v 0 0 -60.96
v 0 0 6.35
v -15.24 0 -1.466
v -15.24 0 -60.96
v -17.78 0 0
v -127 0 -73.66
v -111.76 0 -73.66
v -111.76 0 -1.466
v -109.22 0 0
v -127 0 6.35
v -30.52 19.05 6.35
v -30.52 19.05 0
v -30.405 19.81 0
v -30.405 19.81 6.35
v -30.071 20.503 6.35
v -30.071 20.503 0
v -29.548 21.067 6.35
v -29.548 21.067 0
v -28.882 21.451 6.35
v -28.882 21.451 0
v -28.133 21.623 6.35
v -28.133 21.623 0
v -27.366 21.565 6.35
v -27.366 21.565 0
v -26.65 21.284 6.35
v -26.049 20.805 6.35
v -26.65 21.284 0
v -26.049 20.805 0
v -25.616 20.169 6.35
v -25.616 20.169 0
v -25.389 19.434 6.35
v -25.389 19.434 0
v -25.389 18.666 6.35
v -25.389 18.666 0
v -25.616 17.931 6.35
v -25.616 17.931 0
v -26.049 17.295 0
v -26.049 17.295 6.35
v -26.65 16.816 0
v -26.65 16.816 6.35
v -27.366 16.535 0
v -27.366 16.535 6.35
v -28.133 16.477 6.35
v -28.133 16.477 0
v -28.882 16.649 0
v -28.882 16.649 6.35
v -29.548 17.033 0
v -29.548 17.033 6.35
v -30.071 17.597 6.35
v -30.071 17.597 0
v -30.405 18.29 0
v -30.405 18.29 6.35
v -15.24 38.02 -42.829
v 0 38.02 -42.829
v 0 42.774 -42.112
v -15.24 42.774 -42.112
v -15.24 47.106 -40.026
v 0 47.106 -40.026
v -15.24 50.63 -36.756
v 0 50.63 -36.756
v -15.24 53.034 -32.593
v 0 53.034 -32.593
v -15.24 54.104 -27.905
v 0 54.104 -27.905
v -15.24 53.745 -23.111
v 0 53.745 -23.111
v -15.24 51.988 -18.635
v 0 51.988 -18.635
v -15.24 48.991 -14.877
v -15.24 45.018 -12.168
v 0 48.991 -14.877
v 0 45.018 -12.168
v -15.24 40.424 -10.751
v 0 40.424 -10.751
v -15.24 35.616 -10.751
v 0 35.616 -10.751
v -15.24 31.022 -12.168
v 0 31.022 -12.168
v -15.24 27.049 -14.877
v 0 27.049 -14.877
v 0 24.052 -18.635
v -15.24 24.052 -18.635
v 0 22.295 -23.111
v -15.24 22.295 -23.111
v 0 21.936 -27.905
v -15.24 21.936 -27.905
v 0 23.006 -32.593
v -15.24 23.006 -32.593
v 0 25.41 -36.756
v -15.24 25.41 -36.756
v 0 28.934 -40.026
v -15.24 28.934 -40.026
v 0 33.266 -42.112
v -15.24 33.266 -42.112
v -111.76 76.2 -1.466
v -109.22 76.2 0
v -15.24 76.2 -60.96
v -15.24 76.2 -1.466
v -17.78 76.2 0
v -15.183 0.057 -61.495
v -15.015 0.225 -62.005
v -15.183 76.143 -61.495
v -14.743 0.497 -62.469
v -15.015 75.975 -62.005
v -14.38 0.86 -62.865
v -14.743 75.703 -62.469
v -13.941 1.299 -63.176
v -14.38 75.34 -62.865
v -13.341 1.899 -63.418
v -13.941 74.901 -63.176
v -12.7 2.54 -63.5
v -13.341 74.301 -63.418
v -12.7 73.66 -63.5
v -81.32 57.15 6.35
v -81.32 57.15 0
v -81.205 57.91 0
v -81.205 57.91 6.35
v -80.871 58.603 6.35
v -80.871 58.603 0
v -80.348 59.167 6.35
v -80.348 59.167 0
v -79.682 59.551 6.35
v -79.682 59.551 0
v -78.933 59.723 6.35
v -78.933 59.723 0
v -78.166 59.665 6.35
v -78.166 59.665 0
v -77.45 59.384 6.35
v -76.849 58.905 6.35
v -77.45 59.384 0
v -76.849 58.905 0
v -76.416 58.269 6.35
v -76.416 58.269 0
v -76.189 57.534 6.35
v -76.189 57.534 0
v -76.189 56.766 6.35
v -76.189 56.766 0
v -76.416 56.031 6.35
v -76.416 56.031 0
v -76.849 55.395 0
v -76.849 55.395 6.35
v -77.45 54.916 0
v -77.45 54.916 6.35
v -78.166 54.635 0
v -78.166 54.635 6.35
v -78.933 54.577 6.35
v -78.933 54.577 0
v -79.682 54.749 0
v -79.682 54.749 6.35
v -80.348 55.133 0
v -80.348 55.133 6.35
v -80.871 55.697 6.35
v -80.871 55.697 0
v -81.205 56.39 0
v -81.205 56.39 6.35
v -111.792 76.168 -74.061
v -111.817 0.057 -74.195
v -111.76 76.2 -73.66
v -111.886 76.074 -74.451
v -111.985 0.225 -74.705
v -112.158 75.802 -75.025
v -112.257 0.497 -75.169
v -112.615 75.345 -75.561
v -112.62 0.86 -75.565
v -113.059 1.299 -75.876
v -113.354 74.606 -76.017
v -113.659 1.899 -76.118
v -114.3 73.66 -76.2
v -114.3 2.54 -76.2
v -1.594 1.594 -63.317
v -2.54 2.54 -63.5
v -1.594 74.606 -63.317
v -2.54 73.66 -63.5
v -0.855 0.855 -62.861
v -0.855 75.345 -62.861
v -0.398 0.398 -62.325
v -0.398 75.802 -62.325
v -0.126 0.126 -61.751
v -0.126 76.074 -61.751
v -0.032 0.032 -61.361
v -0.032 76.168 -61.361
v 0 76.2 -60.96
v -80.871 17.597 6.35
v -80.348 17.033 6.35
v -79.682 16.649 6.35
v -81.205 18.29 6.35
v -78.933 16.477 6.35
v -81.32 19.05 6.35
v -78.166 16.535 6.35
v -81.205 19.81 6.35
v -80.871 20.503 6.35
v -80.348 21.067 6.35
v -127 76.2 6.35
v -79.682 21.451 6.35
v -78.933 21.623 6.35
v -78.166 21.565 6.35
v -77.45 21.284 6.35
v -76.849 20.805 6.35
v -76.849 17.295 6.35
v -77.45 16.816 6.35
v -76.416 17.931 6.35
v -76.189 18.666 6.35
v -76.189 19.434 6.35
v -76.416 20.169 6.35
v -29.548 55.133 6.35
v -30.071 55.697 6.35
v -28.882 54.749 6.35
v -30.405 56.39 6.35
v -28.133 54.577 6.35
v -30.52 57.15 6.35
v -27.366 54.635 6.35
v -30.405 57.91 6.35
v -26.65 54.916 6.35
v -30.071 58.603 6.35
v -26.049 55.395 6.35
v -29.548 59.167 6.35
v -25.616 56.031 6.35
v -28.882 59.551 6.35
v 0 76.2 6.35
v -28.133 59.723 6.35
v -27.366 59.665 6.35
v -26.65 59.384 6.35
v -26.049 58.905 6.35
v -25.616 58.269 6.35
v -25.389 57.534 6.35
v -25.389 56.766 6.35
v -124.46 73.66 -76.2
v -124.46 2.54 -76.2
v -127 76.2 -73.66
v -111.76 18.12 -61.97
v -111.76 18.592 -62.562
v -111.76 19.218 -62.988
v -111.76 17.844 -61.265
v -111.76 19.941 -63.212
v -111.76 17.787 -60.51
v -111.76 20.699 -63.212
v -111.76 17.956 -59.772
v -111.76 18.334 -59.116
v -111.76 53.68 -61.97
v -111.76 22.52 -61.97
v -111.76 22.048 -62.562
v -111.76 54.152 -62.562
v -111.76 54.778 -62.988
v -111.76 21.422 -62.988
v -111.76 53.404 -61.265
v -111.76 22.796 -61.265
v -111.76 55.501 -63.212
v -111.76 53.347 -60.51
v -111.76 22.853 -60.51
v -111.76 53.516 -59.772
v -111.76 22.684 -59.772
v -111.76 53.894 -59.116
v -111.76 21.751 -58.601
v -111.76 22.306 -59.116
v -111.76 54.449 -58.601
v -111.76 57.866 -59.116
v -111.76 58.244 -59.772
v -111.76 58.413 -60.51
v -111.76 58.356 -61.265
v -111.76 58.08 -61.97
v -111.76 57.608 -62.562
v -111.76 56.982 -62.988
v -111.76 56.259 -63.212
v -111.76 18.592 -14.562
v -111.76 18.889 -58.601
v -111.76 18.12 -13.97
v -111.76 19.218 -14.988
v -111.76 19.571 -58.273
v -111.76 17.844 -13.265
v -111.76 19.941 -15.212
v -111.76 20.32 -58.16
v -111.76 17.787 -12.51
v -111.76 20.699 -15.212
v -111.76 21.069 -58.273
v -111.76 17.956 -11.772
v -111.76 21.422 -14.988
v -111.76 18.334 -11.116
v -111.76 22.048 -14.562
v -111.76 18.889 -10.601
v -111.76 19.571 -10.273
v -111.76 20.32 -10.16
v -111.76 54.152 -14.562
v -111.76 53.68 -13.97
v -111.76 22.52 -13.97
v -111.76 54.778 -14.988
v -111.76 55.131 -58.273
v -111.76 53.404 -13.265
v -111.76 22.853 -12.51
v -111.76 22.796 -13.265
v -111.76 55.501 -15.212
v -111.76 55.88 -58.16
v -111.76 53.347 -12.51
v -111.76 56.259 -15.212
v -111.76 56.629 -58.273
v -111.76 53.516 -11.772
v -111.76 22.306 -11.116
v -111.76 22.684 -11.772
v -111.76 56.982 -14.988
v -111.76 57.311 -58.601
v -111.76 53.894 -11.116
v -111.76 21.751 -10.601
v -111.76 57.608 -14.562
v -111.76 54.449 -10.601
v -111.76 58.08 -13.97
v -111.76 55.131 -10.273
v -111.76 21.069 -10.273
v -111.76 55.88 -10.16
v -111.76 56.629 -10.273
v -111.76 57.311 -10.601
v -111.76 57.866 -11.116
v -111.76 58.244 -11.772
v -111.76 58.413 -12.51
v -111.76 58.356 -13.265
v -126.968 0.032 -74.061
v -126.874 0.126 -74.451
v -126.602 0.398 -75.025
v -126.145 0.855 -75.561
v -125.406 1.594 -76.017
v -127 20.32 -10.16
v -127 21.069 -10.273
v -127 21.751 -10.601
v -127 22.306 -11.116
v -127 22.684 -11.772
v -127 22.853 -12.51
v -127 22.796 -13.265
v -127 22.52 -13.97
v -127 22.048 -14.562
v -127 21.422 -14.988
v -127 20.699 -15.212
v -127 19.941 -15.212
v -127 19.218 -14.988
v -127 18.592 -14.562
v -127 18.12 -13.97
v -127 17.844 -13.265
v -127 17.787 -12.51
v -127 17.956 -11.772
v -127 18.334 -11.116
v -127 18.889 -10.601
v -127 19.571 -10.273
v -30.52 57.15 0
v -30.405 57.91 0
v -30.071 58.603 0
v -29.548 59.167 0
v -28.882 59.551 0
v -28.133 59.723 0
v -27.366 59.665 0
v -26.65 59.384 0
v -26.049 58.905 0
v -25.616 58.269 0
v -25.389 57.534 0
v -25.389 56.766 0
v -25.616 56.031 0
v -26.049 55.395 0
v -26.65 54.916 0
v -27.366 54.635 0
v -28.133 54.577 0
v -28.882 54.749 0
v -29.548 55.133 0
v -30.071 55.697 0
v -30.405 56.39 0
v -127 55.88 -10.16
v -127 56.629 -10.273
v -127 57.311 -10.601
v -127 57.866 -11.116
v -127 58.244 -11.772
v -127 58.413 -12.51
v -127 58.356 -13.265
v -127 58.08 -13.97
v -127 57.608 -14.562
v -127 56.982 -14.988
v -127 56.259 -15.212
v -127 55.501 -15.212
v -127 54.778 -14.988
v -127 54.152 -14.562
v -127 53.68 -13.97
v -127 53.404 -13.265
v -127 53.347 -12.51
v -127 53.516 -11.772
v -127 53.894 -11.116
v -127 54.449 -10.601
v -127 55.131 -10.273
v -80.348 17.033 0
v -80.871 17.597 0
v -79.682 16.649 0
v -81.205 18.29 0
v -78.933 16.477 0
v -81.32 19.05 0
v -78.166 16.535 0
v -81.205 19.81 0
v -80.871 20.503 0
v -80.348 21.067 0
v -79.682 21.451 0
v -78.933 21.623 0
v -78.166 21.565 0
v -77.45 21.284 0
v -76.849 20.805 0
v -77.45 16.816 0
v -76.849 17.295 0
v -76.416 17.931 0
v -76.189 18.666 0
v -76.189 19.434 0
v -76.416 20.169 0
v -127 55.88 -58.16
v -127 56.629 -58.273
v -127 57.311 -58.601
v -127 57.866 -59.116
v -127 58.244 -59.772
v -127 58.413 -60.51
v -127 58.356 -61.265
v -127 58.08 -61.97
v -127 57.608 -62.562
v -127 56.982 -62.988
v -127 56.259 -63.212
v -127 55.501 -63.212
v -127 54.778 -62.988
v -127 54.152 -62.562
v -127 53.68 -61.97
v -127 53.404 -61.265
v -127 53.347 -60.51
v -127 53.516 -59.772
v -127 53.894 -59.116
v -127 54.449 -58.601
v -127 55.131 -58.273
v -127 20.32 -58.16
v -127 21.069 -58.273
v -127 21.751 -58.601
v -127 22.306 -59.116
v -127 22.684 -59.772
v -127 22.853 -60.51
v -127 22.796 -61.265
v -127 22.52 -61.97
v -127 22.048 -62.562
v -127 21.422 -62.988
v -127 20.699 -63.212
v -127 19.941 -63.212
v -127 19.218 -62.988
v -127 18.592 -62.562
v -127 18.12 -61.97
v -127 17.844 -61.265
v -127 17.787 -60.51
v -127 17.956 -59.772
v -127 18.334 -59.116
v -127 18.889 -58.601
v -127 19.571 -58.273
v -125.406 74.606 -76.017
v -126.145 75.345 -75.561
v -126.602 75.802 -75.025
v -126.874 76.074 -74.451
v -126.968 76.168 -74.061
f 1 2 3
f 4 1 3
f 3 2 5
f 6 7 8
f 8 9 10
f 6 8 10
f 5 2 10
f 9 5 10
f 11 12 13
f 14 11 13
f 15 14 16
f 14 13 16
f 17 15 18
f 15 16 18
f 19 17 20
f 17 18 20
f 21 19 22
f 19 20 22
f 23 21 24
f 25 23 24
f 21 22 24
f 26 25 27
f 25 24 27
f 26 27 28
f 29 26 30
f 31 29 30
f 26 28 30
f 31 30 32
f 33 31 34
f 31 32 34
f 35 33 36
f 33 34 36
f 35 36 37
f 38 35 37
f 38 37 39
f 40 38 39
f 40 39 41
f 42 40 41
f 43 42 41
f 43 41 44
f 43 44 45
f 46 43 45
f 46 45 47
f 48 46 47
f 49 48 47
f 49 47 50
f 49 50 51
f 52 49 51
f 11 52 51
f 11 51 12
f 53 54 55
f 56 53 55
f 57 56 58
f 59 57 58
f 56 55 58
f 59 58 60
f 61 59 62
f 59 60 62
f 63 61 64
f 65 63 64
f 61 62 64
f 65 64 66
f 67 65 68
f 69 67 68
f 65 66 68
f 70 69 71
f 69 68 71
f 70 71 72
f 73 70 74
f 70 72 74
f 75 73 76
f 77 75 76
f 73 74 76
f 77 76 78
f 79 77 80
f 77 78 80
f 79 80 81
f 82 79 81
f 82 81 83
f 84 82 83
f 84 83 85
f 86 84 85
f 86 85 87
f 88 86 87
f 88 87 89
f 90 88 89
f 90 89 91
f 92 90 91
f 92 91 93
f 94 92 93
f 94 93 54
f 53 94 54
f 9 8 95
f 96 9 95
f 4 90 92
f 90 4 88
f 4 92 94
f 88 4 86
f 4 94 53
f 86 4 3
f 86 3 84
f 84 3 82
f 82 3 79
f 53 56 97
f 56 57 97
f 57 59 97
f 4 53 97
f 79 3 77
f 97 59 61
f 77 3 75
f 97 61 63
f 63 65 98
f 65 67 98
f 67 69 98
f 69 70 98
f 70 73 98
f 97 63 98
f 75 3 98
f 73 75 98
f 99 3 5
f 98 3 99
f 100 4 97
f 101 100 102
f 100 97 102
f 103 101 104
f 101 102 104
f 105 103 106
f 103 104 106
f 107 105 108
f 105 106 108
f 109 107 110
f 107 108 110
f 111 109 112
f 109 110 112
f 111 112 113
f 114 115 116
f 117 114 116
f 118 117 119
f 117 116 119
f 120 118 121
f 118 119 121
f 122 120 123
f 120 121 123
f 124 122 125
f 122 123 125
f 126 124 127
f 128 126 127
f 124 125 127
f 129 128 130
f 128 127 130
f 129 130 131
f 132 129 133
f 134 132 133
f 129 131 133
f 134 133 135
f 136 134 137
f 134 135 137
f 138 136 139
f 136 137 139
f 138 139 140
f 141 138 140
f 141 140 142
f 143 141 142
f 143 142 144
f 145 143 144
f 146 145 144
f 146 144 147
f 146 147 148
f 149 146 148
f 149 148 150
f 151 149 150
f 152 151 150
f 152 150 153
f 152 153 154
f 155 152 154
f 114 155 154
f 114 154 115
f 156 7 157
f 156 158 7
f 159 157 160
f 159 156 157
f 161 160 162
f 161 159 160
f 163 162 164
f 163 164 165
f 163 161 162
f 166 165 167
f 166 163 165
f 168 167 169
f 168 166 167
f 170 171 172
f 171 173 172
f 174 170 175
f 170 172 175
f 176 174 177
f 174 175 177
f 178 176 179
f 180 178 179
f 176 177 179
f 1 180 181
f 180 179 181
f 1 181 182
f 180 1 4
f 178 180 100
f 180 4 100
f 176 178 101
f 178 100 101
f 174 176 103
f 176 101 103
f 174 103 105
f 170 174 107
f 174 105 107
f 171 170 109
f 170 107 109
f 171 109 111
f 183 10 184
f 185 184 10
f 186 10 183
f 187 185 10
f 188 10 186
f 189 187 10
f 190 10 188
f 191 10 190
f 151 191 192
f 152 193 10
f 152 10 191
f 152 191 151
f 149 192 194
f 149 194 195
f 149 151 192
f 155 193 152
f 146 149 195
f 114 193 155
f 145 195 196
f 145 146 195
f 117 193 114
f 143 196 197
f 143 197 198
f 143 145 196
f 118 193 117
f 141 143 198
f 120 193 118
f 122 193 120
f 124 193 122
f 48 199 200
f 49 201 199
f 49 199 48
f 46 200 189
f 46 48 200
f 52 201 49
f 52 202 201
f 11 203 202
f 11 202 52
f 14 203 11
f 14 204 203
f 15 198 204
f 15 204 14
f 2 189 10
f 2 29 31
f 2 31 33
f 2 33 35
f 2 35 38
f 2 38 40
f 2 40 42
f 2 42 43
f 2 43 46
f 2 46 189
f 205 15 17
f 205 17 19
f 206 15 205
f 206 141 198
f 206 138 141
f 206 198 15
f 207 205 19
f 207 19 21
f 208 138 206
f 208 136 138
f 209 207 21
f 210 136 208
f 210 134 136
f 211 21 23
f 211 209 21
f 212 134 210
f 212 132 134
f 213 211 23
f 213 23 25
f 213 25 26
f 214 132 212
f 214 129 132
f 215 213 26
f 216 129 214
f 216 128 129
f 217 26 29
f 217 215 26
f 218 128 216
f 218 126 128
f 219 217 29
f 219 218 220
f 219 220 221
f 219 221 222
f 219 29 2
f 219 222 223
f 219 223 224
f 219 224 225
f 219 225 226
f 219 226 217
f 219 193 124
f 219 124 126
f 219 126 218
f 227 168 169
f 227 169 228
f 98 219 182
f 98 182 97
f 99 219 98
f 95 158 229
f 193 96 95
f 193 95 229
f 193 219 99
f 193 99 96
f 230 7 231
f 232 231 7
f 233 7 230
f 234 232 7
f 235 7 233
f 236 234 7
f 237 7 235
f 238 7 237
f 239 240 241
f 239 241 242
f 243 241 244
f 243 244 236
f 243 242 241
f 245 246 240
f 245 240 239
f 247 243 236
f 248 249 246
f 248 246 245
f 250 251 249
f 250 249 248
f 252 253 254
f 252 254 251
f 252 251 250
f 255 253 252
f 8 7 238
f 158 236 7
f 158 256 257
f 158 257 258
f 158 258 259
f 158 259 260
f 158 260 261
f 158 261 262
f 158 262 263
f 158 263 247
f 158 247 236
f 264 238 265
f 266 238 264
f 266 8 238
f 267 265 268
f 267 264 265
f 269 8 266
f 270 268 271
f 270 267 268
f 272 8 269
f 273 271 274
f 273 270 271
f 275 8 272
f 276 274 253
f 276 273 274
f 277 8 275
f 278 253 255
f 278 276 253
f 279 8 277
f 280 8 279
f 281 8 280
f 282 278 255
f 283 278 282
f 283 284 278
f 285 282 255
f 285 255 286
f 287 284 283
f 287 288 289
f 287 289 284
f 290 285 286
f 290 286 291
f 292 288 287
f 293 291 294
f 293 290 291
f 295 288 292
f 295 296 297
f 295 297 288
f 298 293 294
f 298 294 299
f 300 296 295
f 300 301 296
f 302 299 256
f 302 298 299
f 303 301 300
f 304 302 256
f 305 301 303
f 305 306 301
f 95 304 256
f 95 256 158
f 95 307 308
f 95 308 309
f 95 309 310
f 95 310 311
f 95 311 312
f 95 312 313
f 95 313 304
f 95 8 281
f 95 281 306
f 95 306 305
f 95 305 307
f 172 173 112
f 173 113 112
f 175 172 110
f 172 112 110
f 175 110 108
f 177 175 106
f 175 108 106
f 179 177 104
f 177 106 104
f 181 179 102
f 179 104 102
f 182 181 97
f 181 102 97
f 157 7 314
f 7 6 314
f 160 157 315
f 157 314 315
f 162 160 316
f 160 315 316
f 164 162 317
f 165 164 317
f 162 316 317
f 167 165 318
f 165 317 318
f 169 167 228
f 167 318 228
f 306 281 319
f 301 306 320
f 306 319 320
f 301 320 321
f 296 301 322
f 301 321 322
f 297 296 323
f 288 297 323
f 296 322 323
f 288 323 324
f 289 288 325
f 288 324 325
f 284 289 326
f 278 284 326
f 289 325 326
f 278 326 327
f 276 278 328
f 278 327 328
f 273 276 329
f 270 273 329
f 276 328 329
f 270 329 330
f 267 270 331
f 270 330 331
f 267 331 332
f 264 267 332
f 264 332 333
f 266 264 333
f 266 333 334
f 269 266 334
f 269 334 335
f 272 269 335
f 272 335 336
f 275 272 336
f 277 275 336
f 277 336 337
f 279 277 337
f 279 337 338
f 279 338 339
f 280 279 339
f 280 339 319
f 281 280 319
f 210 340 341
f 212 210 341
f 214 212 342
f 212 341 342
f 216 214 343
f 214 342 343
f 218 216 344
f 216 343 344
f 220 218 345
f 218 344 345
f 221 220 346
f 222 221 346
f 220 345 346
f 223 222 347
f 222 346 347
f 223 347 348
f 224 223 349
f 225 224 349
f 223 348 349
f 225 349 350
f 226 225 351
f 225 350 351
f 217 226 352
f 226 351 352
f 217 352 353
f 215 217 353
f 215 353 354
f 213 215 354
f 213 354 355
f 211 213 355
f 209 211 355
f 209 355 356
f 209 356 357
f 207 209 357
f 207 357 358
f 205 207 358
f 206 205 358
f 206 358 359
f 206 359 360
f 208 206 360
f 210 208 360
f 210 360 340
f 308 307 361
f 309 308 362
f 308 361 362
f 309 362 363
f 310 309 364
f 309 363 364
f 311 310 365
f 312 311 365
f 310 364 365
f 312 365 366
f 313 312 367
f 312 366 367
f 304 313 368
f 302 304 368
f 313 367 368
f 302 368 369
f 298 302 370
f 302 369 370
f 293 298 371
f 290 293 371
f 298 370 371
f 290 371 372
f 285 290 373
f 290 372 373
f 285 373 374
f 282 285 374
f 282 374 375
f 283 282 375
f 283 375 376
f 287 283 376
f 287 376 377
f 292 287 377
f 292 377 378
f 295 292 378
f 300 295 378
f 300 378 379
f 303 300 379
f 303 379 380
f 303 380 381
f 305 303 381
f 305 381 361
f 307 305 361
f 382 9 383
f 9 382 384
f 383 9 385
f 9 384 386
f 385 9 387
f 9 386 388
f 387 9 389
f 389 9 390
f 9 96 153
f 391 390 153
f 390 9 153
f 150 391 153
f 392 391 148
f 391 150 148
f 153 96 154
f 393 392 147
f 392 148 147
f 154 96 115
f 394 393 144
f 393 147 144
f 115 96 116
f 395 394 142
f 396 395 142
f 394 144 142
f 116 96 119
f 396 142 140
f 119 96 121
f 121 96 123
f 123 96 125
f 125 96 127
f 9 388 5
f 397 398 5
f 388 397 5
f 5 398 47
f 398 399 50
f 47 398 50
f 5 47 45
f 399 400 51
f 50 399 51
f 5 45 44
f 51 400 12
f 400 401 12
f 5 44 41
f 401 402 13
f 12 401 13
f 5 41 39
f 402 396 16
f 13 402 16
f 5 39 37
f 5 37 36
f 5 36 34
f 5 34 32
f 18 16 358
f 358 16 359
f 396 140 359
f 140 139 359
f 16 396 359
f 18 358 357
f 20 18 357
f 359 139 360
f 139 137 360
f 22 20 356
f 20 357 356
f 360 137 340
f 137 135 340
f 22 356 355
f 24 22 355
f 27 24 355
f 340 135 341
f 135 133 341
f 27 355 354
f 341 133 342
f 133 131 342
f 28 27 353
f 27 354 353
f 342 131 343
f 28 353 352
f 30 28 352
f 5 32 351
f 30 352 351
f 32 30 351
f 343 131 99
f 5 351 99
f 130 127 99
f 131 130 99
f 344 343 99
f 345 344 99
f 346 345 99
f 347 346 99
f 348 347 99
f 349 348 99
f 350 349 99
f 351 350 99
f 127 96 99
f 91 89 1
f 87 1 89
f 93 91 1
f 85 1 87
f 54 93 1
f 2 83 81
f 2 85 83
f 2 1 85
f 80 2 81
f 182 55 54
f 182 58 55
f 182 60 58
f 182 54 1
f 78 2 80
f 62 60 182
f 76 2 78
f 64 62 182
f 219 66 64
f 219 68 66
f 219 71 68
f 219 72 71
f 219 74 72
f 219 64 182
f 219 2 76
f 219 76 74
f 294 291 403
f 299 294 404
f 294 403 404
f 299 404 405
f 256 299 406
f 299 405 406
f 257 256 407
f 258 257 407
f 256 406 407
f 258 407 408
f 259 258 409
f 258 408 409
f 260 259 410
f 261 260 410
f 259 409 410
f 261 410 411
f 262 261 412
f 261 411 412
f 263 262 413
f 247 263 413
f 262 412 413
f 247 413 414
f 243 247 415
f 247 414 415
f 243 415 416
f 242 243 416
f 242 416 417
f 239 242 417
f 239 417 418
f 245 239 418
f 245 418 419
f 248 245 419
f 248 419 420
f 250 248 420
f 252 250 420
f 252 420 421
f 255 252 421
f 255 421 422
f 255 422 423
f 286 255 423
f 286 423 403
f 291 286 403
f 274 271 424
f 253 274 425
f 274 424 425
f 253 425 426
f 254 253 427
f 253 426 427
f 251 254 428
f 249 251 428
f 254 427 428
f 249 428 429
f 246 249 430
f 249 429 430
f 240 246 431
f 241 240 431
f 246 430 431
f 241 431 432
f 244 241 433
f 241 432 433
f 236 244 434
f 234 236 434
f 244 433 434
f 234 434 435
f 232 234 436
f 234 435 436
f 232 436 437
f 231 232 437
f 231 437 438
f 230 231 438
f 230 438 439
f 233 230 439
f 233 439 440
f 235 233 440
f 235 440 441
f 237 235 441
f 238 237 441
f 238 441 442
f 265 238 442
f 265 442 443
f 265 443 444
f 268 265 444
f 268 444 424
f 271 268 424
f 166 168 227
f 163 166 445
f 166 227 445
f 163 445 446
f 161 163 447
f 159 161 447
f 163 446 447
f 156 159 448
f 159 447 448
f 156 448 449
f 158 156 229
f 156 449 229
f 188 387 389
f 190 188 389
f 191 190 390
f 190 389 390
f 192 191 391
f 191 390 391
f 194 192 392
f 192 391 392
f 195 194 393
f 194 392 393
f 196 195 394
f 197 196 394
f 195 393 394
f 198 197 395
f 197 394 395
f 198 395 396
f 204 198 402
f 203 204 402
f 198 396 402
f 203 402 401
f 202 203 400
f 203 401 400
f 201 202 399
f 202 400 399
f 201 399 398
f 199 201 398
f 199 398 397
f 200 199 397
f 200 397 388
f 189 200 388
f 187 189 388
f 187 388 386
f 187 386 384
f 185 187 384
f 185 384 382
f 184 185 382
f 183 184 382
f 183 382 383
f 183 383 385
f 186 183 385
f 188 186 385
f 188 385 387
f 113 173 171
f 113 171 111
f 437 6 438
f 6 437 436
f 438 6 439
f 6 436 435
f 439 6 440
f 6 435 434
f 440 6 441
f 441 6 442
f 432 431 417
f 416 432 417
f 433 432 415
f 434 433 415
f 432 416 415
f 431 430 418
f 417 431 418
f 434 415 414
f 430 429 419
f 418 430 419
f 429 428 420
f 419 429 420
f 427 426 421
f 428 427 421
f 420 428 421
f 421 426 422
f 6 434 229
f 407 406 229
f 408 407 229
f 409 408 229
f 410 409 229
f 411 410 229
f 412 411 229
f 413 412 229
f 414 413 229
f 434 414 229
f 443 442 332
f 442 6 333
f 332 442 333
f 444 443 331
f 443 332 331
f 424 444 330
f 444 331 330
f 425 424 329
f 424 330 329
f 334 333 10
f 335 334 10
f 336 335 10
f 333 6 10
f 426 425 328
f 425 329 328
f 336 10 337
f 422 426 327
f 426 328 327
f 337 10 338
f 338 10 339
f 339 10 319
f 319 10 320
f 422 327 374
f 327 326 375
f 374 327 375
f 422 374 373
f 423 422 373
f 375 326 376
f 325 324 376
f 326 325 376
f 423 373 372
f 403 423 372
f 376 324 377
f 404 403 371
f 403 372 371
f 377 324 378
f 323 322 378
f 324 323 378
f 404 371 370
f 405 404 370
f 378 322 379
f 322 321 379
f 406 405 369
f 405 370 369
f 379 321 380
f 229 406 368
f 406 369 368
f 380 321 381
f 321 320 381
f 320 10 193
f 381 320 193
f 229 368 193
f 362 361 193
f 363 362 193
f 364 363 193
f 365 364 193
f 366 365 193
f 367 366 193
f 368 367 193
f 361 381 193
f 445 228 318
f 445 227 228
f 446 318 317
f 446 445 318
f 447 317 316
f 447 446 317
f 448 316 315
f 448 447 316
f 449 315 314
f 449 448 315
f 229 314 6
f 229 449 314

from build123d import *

# Parameters (mm, degrees)
SKETCH2_W                        = 127
SKETCH2_H                        = 76.2
BOSS_EXTRUDE1_DEPTH              = 6.35
F_13_64_0_20313_DIAMETER_HOLE1_D = 5.159502
SKETCH5_W                        = 15.24
SKETCH5_H                        = 76.2
BOSS_EXTRUDE2_DEPTH              = 63.5
CHAMFER1_SIZE                    = 2.54
CHAMFER1_SIZE2                   = 1.466469684
FILLET3_R                        = 2.54
SKETCH9_W                        = 15.24
SKETCH9_H                        = 76.2
BOSS_EXTRUDE3_DEPTH              = 76.2
CHAMFER5_SIZE                    = 2.54
CHAMFER5_SIZE2                   = 1.466469684
FILLET5_R                        = 2.54
CUT_EXTRUDE1_REACH               = 129
SKETCH17_R                       = 2.54
CUT_EXTRUDE2_REACH               = 129
SKETCH18_R                       = 16.129


with BuildPart() as part:
    # Sketch2 → Boss-Extrude1 (new body)
    with BuildSketch(Plane.XY):
        with Locations((-63.5, 38.1)):
            Rectangle(SKETCH2_W, SKETCH2_H)
    extrude(amount=BOSS_EXTRUDE1_DEPTH)

    # 13/64 (0.20313) Diameter Hole1 (through all)
    with Locations(Plane.XY.offset(6.35)):
        with Locations((-78.74, 57.15), (-78.74, 19.05), (-27.94, 57.15), (-27.94, 19.05)):
            Hole(F_13_64_0_20313_DIAMETER_HOLE1_D / 2)

    # Sketch5 → Boss-Extrude2 (add)
    with BuildSketch(Plane(origin=(0, 0, 0), x_dir=(-1, 0, 0), z_dir=(0, 0, -1))):
        with Locations((7.62, 38.1)):
            Rectangle(SKETCH5_W, SKETCH5_H)
    extrude(amount=BOSS_EXTRUDE2_DEPTH)

    # Chamfer1
    chamfer1_edges = [part.edges().sort_by_distance(p)[0] for p in [
        (-15.24, 38.1, 0),
    ]]
    chamfer1_side = [part.faces().sort_by_distance(p)[0] for p in [
        (-71.296336335, 38.1, 0),
    ]]
    chamfer(chamfer1_edges, length=CHAMFER1_SIZE, length2=CHAMFER1_SIZE2, reference=chamfer1_side[0])

    # Fillet3
    fillet3_edges = [part.edges().sort_by_distance(p)[0] for p in [
        (-15.24, 38.1, -63.5),
        (-7.62, 76.2, -63.5),
        (0, 38.1, -63.5),
        (-7.62, 0, -63.5),
    ]]
    fillet(fillet3_edges, radius=FILLET3_R)

    # Sketch9 → Boss-Extrude3 (add)
    with BuildSketch(Plane(origin=(0, 0, 0), x_dir=(-1, 0, 0), z_dir=(0, 0, -1))):
        with Locations((119.38, 38.1)):
            Rectangle(SKETCH9_W, SKETCH9_H)
    extrude(amount=BOSS_EXTRUDE3_DEPTH)

    # Chamfer5
    chamfer5_edges = [part.edges().sort_by_distance(p)[0] for p in [
        (-111.76, 38.1, 0),
    ]]
    chamfer5_side = [part.faces().sort_by_distance(p)[0] for p in [
        (-64.905058797, 38.1, 0),
    ]]
    chamfer(chamfer5_edges, length=CHAMFER5_SIZE, length2=CHAMFER5_SIZE2, reference=chamfer5_side[0])

    # Fillet5
    fillet5_edges = [part.edges().sort_by_distance(p)[0] for p in [
        (-127, 38.1, -76.2),
        (-119.38, 76.2, -76.2),
        (-111.76, 38.1, -76.2),
        (-119.38, 0, -76.2),
    ]]
    fillet(fillet5_edges, radius=FILLET5_R)

    # Sketch17 → Cut-Extrude1 (cut, up to next)
    with BuildSketch(Plane.ZY.offset(127), mode=Mode.PRIVATE) as cut_extrude1_sk1:
        with Locations((-12.7, 20.32)):
            Circle(SKETCH17_R)
    cut_extrude1_tool1 = extrude(cut_extrude1_sk1.sketch, amount=-CUT_EXTRUDE1_REACH, mode=Mode.PRIVATE) & part.part
    add(cut_extrude1_tool1.solids().sort_by_distance((-127, 20.32, -12.7))[0], mode=Mode.SUBTRACT)
    # Sketch17 → Cut-Extrude1 (cut, up to next)
    with BuildSketch(Plane.ZY.offset(127), mode=Mode.PRIVATE) as cut_extrude1_sk2:
        with Locations((-12.7, 55.88)):
            Circle(SKETCH17_R)
    cut_extrude1_tool2 = extrude(cut_extrude1_sk2.sketch, amount=-CUT_EXTRUDE1_REACH, mode=Mode.PRIVATE) & part.part
    add(cut_extrude1_tool2.solids().sort_by_distance((-127, 55.88, -12.7))[0], mode=Mode.SUBTRACT)
    # Sketch17 → Cut-Extrude1 (cut, up to next)
    with BuildSketch(Plane.ZY.offset(127), mode=Mode.PRIVATE) as cut_extrude1_sk3:
        with Locations((-60.7, 20.32)):
            Circle(SKETCH17_R)
    cut_extrude1_tool3 = extrude(cut_extrude1_sk3.sketch, amount=-CUT_EXTRUDE1_REACH, mode=Mode.PRIVATE) & part.part
    add(cut_extrude1_tool3.solids().sort_by_distance((-127, 20.32, -60.7))[0], mode=Mode.SUBTRACT)
    # Sketch17 → Cut-Extrude1 (cut, up to next)
    with BuildSketch(Plane.ZY.offset(127), mode=Mode.PRIVATE) as cut_extrude1_sk4:
        with Locations((-60.7, 55.88)):
            Circle(SKETCH17_R)
    cut_extrude1_tool4 = extrude(cut_extrude1_sk4.sketch, amount=-CUT_EXTRUDE1_REACH, mode=Mode.PRIVATE) & part.part
    add(cut_extrude1_tool4.solids().sort_by_distance((-127, 55.88, -60.7))[0], mode=Mode.SUBTRACT)

    # Sketch18 → Cut-Extrude2 (cut, up to next)
    with BuildSketch(Plane(origin=(0, 0, 0), x_dir=(0, 0, -1), z_dir=(1, 0, 0)), mode=Mode.PRIVATE) as cut_extrude2_sk1:
        with Locations((26.7, 38.02)):
            Circle(SKETCH18_R)
    cut_extrude2_tool1 = extrude(cut_extrude2_sk1.sketch, amount=-CUT_EXTRUDE2_REACH, mode=Mode.PRIVATE) & part.part
    add(cut_extrude2_tool1.solids().sort_by_distance((0, 38.02, -26.7))[0], mode=Mode.SUBTRACT)


solid = part.part
